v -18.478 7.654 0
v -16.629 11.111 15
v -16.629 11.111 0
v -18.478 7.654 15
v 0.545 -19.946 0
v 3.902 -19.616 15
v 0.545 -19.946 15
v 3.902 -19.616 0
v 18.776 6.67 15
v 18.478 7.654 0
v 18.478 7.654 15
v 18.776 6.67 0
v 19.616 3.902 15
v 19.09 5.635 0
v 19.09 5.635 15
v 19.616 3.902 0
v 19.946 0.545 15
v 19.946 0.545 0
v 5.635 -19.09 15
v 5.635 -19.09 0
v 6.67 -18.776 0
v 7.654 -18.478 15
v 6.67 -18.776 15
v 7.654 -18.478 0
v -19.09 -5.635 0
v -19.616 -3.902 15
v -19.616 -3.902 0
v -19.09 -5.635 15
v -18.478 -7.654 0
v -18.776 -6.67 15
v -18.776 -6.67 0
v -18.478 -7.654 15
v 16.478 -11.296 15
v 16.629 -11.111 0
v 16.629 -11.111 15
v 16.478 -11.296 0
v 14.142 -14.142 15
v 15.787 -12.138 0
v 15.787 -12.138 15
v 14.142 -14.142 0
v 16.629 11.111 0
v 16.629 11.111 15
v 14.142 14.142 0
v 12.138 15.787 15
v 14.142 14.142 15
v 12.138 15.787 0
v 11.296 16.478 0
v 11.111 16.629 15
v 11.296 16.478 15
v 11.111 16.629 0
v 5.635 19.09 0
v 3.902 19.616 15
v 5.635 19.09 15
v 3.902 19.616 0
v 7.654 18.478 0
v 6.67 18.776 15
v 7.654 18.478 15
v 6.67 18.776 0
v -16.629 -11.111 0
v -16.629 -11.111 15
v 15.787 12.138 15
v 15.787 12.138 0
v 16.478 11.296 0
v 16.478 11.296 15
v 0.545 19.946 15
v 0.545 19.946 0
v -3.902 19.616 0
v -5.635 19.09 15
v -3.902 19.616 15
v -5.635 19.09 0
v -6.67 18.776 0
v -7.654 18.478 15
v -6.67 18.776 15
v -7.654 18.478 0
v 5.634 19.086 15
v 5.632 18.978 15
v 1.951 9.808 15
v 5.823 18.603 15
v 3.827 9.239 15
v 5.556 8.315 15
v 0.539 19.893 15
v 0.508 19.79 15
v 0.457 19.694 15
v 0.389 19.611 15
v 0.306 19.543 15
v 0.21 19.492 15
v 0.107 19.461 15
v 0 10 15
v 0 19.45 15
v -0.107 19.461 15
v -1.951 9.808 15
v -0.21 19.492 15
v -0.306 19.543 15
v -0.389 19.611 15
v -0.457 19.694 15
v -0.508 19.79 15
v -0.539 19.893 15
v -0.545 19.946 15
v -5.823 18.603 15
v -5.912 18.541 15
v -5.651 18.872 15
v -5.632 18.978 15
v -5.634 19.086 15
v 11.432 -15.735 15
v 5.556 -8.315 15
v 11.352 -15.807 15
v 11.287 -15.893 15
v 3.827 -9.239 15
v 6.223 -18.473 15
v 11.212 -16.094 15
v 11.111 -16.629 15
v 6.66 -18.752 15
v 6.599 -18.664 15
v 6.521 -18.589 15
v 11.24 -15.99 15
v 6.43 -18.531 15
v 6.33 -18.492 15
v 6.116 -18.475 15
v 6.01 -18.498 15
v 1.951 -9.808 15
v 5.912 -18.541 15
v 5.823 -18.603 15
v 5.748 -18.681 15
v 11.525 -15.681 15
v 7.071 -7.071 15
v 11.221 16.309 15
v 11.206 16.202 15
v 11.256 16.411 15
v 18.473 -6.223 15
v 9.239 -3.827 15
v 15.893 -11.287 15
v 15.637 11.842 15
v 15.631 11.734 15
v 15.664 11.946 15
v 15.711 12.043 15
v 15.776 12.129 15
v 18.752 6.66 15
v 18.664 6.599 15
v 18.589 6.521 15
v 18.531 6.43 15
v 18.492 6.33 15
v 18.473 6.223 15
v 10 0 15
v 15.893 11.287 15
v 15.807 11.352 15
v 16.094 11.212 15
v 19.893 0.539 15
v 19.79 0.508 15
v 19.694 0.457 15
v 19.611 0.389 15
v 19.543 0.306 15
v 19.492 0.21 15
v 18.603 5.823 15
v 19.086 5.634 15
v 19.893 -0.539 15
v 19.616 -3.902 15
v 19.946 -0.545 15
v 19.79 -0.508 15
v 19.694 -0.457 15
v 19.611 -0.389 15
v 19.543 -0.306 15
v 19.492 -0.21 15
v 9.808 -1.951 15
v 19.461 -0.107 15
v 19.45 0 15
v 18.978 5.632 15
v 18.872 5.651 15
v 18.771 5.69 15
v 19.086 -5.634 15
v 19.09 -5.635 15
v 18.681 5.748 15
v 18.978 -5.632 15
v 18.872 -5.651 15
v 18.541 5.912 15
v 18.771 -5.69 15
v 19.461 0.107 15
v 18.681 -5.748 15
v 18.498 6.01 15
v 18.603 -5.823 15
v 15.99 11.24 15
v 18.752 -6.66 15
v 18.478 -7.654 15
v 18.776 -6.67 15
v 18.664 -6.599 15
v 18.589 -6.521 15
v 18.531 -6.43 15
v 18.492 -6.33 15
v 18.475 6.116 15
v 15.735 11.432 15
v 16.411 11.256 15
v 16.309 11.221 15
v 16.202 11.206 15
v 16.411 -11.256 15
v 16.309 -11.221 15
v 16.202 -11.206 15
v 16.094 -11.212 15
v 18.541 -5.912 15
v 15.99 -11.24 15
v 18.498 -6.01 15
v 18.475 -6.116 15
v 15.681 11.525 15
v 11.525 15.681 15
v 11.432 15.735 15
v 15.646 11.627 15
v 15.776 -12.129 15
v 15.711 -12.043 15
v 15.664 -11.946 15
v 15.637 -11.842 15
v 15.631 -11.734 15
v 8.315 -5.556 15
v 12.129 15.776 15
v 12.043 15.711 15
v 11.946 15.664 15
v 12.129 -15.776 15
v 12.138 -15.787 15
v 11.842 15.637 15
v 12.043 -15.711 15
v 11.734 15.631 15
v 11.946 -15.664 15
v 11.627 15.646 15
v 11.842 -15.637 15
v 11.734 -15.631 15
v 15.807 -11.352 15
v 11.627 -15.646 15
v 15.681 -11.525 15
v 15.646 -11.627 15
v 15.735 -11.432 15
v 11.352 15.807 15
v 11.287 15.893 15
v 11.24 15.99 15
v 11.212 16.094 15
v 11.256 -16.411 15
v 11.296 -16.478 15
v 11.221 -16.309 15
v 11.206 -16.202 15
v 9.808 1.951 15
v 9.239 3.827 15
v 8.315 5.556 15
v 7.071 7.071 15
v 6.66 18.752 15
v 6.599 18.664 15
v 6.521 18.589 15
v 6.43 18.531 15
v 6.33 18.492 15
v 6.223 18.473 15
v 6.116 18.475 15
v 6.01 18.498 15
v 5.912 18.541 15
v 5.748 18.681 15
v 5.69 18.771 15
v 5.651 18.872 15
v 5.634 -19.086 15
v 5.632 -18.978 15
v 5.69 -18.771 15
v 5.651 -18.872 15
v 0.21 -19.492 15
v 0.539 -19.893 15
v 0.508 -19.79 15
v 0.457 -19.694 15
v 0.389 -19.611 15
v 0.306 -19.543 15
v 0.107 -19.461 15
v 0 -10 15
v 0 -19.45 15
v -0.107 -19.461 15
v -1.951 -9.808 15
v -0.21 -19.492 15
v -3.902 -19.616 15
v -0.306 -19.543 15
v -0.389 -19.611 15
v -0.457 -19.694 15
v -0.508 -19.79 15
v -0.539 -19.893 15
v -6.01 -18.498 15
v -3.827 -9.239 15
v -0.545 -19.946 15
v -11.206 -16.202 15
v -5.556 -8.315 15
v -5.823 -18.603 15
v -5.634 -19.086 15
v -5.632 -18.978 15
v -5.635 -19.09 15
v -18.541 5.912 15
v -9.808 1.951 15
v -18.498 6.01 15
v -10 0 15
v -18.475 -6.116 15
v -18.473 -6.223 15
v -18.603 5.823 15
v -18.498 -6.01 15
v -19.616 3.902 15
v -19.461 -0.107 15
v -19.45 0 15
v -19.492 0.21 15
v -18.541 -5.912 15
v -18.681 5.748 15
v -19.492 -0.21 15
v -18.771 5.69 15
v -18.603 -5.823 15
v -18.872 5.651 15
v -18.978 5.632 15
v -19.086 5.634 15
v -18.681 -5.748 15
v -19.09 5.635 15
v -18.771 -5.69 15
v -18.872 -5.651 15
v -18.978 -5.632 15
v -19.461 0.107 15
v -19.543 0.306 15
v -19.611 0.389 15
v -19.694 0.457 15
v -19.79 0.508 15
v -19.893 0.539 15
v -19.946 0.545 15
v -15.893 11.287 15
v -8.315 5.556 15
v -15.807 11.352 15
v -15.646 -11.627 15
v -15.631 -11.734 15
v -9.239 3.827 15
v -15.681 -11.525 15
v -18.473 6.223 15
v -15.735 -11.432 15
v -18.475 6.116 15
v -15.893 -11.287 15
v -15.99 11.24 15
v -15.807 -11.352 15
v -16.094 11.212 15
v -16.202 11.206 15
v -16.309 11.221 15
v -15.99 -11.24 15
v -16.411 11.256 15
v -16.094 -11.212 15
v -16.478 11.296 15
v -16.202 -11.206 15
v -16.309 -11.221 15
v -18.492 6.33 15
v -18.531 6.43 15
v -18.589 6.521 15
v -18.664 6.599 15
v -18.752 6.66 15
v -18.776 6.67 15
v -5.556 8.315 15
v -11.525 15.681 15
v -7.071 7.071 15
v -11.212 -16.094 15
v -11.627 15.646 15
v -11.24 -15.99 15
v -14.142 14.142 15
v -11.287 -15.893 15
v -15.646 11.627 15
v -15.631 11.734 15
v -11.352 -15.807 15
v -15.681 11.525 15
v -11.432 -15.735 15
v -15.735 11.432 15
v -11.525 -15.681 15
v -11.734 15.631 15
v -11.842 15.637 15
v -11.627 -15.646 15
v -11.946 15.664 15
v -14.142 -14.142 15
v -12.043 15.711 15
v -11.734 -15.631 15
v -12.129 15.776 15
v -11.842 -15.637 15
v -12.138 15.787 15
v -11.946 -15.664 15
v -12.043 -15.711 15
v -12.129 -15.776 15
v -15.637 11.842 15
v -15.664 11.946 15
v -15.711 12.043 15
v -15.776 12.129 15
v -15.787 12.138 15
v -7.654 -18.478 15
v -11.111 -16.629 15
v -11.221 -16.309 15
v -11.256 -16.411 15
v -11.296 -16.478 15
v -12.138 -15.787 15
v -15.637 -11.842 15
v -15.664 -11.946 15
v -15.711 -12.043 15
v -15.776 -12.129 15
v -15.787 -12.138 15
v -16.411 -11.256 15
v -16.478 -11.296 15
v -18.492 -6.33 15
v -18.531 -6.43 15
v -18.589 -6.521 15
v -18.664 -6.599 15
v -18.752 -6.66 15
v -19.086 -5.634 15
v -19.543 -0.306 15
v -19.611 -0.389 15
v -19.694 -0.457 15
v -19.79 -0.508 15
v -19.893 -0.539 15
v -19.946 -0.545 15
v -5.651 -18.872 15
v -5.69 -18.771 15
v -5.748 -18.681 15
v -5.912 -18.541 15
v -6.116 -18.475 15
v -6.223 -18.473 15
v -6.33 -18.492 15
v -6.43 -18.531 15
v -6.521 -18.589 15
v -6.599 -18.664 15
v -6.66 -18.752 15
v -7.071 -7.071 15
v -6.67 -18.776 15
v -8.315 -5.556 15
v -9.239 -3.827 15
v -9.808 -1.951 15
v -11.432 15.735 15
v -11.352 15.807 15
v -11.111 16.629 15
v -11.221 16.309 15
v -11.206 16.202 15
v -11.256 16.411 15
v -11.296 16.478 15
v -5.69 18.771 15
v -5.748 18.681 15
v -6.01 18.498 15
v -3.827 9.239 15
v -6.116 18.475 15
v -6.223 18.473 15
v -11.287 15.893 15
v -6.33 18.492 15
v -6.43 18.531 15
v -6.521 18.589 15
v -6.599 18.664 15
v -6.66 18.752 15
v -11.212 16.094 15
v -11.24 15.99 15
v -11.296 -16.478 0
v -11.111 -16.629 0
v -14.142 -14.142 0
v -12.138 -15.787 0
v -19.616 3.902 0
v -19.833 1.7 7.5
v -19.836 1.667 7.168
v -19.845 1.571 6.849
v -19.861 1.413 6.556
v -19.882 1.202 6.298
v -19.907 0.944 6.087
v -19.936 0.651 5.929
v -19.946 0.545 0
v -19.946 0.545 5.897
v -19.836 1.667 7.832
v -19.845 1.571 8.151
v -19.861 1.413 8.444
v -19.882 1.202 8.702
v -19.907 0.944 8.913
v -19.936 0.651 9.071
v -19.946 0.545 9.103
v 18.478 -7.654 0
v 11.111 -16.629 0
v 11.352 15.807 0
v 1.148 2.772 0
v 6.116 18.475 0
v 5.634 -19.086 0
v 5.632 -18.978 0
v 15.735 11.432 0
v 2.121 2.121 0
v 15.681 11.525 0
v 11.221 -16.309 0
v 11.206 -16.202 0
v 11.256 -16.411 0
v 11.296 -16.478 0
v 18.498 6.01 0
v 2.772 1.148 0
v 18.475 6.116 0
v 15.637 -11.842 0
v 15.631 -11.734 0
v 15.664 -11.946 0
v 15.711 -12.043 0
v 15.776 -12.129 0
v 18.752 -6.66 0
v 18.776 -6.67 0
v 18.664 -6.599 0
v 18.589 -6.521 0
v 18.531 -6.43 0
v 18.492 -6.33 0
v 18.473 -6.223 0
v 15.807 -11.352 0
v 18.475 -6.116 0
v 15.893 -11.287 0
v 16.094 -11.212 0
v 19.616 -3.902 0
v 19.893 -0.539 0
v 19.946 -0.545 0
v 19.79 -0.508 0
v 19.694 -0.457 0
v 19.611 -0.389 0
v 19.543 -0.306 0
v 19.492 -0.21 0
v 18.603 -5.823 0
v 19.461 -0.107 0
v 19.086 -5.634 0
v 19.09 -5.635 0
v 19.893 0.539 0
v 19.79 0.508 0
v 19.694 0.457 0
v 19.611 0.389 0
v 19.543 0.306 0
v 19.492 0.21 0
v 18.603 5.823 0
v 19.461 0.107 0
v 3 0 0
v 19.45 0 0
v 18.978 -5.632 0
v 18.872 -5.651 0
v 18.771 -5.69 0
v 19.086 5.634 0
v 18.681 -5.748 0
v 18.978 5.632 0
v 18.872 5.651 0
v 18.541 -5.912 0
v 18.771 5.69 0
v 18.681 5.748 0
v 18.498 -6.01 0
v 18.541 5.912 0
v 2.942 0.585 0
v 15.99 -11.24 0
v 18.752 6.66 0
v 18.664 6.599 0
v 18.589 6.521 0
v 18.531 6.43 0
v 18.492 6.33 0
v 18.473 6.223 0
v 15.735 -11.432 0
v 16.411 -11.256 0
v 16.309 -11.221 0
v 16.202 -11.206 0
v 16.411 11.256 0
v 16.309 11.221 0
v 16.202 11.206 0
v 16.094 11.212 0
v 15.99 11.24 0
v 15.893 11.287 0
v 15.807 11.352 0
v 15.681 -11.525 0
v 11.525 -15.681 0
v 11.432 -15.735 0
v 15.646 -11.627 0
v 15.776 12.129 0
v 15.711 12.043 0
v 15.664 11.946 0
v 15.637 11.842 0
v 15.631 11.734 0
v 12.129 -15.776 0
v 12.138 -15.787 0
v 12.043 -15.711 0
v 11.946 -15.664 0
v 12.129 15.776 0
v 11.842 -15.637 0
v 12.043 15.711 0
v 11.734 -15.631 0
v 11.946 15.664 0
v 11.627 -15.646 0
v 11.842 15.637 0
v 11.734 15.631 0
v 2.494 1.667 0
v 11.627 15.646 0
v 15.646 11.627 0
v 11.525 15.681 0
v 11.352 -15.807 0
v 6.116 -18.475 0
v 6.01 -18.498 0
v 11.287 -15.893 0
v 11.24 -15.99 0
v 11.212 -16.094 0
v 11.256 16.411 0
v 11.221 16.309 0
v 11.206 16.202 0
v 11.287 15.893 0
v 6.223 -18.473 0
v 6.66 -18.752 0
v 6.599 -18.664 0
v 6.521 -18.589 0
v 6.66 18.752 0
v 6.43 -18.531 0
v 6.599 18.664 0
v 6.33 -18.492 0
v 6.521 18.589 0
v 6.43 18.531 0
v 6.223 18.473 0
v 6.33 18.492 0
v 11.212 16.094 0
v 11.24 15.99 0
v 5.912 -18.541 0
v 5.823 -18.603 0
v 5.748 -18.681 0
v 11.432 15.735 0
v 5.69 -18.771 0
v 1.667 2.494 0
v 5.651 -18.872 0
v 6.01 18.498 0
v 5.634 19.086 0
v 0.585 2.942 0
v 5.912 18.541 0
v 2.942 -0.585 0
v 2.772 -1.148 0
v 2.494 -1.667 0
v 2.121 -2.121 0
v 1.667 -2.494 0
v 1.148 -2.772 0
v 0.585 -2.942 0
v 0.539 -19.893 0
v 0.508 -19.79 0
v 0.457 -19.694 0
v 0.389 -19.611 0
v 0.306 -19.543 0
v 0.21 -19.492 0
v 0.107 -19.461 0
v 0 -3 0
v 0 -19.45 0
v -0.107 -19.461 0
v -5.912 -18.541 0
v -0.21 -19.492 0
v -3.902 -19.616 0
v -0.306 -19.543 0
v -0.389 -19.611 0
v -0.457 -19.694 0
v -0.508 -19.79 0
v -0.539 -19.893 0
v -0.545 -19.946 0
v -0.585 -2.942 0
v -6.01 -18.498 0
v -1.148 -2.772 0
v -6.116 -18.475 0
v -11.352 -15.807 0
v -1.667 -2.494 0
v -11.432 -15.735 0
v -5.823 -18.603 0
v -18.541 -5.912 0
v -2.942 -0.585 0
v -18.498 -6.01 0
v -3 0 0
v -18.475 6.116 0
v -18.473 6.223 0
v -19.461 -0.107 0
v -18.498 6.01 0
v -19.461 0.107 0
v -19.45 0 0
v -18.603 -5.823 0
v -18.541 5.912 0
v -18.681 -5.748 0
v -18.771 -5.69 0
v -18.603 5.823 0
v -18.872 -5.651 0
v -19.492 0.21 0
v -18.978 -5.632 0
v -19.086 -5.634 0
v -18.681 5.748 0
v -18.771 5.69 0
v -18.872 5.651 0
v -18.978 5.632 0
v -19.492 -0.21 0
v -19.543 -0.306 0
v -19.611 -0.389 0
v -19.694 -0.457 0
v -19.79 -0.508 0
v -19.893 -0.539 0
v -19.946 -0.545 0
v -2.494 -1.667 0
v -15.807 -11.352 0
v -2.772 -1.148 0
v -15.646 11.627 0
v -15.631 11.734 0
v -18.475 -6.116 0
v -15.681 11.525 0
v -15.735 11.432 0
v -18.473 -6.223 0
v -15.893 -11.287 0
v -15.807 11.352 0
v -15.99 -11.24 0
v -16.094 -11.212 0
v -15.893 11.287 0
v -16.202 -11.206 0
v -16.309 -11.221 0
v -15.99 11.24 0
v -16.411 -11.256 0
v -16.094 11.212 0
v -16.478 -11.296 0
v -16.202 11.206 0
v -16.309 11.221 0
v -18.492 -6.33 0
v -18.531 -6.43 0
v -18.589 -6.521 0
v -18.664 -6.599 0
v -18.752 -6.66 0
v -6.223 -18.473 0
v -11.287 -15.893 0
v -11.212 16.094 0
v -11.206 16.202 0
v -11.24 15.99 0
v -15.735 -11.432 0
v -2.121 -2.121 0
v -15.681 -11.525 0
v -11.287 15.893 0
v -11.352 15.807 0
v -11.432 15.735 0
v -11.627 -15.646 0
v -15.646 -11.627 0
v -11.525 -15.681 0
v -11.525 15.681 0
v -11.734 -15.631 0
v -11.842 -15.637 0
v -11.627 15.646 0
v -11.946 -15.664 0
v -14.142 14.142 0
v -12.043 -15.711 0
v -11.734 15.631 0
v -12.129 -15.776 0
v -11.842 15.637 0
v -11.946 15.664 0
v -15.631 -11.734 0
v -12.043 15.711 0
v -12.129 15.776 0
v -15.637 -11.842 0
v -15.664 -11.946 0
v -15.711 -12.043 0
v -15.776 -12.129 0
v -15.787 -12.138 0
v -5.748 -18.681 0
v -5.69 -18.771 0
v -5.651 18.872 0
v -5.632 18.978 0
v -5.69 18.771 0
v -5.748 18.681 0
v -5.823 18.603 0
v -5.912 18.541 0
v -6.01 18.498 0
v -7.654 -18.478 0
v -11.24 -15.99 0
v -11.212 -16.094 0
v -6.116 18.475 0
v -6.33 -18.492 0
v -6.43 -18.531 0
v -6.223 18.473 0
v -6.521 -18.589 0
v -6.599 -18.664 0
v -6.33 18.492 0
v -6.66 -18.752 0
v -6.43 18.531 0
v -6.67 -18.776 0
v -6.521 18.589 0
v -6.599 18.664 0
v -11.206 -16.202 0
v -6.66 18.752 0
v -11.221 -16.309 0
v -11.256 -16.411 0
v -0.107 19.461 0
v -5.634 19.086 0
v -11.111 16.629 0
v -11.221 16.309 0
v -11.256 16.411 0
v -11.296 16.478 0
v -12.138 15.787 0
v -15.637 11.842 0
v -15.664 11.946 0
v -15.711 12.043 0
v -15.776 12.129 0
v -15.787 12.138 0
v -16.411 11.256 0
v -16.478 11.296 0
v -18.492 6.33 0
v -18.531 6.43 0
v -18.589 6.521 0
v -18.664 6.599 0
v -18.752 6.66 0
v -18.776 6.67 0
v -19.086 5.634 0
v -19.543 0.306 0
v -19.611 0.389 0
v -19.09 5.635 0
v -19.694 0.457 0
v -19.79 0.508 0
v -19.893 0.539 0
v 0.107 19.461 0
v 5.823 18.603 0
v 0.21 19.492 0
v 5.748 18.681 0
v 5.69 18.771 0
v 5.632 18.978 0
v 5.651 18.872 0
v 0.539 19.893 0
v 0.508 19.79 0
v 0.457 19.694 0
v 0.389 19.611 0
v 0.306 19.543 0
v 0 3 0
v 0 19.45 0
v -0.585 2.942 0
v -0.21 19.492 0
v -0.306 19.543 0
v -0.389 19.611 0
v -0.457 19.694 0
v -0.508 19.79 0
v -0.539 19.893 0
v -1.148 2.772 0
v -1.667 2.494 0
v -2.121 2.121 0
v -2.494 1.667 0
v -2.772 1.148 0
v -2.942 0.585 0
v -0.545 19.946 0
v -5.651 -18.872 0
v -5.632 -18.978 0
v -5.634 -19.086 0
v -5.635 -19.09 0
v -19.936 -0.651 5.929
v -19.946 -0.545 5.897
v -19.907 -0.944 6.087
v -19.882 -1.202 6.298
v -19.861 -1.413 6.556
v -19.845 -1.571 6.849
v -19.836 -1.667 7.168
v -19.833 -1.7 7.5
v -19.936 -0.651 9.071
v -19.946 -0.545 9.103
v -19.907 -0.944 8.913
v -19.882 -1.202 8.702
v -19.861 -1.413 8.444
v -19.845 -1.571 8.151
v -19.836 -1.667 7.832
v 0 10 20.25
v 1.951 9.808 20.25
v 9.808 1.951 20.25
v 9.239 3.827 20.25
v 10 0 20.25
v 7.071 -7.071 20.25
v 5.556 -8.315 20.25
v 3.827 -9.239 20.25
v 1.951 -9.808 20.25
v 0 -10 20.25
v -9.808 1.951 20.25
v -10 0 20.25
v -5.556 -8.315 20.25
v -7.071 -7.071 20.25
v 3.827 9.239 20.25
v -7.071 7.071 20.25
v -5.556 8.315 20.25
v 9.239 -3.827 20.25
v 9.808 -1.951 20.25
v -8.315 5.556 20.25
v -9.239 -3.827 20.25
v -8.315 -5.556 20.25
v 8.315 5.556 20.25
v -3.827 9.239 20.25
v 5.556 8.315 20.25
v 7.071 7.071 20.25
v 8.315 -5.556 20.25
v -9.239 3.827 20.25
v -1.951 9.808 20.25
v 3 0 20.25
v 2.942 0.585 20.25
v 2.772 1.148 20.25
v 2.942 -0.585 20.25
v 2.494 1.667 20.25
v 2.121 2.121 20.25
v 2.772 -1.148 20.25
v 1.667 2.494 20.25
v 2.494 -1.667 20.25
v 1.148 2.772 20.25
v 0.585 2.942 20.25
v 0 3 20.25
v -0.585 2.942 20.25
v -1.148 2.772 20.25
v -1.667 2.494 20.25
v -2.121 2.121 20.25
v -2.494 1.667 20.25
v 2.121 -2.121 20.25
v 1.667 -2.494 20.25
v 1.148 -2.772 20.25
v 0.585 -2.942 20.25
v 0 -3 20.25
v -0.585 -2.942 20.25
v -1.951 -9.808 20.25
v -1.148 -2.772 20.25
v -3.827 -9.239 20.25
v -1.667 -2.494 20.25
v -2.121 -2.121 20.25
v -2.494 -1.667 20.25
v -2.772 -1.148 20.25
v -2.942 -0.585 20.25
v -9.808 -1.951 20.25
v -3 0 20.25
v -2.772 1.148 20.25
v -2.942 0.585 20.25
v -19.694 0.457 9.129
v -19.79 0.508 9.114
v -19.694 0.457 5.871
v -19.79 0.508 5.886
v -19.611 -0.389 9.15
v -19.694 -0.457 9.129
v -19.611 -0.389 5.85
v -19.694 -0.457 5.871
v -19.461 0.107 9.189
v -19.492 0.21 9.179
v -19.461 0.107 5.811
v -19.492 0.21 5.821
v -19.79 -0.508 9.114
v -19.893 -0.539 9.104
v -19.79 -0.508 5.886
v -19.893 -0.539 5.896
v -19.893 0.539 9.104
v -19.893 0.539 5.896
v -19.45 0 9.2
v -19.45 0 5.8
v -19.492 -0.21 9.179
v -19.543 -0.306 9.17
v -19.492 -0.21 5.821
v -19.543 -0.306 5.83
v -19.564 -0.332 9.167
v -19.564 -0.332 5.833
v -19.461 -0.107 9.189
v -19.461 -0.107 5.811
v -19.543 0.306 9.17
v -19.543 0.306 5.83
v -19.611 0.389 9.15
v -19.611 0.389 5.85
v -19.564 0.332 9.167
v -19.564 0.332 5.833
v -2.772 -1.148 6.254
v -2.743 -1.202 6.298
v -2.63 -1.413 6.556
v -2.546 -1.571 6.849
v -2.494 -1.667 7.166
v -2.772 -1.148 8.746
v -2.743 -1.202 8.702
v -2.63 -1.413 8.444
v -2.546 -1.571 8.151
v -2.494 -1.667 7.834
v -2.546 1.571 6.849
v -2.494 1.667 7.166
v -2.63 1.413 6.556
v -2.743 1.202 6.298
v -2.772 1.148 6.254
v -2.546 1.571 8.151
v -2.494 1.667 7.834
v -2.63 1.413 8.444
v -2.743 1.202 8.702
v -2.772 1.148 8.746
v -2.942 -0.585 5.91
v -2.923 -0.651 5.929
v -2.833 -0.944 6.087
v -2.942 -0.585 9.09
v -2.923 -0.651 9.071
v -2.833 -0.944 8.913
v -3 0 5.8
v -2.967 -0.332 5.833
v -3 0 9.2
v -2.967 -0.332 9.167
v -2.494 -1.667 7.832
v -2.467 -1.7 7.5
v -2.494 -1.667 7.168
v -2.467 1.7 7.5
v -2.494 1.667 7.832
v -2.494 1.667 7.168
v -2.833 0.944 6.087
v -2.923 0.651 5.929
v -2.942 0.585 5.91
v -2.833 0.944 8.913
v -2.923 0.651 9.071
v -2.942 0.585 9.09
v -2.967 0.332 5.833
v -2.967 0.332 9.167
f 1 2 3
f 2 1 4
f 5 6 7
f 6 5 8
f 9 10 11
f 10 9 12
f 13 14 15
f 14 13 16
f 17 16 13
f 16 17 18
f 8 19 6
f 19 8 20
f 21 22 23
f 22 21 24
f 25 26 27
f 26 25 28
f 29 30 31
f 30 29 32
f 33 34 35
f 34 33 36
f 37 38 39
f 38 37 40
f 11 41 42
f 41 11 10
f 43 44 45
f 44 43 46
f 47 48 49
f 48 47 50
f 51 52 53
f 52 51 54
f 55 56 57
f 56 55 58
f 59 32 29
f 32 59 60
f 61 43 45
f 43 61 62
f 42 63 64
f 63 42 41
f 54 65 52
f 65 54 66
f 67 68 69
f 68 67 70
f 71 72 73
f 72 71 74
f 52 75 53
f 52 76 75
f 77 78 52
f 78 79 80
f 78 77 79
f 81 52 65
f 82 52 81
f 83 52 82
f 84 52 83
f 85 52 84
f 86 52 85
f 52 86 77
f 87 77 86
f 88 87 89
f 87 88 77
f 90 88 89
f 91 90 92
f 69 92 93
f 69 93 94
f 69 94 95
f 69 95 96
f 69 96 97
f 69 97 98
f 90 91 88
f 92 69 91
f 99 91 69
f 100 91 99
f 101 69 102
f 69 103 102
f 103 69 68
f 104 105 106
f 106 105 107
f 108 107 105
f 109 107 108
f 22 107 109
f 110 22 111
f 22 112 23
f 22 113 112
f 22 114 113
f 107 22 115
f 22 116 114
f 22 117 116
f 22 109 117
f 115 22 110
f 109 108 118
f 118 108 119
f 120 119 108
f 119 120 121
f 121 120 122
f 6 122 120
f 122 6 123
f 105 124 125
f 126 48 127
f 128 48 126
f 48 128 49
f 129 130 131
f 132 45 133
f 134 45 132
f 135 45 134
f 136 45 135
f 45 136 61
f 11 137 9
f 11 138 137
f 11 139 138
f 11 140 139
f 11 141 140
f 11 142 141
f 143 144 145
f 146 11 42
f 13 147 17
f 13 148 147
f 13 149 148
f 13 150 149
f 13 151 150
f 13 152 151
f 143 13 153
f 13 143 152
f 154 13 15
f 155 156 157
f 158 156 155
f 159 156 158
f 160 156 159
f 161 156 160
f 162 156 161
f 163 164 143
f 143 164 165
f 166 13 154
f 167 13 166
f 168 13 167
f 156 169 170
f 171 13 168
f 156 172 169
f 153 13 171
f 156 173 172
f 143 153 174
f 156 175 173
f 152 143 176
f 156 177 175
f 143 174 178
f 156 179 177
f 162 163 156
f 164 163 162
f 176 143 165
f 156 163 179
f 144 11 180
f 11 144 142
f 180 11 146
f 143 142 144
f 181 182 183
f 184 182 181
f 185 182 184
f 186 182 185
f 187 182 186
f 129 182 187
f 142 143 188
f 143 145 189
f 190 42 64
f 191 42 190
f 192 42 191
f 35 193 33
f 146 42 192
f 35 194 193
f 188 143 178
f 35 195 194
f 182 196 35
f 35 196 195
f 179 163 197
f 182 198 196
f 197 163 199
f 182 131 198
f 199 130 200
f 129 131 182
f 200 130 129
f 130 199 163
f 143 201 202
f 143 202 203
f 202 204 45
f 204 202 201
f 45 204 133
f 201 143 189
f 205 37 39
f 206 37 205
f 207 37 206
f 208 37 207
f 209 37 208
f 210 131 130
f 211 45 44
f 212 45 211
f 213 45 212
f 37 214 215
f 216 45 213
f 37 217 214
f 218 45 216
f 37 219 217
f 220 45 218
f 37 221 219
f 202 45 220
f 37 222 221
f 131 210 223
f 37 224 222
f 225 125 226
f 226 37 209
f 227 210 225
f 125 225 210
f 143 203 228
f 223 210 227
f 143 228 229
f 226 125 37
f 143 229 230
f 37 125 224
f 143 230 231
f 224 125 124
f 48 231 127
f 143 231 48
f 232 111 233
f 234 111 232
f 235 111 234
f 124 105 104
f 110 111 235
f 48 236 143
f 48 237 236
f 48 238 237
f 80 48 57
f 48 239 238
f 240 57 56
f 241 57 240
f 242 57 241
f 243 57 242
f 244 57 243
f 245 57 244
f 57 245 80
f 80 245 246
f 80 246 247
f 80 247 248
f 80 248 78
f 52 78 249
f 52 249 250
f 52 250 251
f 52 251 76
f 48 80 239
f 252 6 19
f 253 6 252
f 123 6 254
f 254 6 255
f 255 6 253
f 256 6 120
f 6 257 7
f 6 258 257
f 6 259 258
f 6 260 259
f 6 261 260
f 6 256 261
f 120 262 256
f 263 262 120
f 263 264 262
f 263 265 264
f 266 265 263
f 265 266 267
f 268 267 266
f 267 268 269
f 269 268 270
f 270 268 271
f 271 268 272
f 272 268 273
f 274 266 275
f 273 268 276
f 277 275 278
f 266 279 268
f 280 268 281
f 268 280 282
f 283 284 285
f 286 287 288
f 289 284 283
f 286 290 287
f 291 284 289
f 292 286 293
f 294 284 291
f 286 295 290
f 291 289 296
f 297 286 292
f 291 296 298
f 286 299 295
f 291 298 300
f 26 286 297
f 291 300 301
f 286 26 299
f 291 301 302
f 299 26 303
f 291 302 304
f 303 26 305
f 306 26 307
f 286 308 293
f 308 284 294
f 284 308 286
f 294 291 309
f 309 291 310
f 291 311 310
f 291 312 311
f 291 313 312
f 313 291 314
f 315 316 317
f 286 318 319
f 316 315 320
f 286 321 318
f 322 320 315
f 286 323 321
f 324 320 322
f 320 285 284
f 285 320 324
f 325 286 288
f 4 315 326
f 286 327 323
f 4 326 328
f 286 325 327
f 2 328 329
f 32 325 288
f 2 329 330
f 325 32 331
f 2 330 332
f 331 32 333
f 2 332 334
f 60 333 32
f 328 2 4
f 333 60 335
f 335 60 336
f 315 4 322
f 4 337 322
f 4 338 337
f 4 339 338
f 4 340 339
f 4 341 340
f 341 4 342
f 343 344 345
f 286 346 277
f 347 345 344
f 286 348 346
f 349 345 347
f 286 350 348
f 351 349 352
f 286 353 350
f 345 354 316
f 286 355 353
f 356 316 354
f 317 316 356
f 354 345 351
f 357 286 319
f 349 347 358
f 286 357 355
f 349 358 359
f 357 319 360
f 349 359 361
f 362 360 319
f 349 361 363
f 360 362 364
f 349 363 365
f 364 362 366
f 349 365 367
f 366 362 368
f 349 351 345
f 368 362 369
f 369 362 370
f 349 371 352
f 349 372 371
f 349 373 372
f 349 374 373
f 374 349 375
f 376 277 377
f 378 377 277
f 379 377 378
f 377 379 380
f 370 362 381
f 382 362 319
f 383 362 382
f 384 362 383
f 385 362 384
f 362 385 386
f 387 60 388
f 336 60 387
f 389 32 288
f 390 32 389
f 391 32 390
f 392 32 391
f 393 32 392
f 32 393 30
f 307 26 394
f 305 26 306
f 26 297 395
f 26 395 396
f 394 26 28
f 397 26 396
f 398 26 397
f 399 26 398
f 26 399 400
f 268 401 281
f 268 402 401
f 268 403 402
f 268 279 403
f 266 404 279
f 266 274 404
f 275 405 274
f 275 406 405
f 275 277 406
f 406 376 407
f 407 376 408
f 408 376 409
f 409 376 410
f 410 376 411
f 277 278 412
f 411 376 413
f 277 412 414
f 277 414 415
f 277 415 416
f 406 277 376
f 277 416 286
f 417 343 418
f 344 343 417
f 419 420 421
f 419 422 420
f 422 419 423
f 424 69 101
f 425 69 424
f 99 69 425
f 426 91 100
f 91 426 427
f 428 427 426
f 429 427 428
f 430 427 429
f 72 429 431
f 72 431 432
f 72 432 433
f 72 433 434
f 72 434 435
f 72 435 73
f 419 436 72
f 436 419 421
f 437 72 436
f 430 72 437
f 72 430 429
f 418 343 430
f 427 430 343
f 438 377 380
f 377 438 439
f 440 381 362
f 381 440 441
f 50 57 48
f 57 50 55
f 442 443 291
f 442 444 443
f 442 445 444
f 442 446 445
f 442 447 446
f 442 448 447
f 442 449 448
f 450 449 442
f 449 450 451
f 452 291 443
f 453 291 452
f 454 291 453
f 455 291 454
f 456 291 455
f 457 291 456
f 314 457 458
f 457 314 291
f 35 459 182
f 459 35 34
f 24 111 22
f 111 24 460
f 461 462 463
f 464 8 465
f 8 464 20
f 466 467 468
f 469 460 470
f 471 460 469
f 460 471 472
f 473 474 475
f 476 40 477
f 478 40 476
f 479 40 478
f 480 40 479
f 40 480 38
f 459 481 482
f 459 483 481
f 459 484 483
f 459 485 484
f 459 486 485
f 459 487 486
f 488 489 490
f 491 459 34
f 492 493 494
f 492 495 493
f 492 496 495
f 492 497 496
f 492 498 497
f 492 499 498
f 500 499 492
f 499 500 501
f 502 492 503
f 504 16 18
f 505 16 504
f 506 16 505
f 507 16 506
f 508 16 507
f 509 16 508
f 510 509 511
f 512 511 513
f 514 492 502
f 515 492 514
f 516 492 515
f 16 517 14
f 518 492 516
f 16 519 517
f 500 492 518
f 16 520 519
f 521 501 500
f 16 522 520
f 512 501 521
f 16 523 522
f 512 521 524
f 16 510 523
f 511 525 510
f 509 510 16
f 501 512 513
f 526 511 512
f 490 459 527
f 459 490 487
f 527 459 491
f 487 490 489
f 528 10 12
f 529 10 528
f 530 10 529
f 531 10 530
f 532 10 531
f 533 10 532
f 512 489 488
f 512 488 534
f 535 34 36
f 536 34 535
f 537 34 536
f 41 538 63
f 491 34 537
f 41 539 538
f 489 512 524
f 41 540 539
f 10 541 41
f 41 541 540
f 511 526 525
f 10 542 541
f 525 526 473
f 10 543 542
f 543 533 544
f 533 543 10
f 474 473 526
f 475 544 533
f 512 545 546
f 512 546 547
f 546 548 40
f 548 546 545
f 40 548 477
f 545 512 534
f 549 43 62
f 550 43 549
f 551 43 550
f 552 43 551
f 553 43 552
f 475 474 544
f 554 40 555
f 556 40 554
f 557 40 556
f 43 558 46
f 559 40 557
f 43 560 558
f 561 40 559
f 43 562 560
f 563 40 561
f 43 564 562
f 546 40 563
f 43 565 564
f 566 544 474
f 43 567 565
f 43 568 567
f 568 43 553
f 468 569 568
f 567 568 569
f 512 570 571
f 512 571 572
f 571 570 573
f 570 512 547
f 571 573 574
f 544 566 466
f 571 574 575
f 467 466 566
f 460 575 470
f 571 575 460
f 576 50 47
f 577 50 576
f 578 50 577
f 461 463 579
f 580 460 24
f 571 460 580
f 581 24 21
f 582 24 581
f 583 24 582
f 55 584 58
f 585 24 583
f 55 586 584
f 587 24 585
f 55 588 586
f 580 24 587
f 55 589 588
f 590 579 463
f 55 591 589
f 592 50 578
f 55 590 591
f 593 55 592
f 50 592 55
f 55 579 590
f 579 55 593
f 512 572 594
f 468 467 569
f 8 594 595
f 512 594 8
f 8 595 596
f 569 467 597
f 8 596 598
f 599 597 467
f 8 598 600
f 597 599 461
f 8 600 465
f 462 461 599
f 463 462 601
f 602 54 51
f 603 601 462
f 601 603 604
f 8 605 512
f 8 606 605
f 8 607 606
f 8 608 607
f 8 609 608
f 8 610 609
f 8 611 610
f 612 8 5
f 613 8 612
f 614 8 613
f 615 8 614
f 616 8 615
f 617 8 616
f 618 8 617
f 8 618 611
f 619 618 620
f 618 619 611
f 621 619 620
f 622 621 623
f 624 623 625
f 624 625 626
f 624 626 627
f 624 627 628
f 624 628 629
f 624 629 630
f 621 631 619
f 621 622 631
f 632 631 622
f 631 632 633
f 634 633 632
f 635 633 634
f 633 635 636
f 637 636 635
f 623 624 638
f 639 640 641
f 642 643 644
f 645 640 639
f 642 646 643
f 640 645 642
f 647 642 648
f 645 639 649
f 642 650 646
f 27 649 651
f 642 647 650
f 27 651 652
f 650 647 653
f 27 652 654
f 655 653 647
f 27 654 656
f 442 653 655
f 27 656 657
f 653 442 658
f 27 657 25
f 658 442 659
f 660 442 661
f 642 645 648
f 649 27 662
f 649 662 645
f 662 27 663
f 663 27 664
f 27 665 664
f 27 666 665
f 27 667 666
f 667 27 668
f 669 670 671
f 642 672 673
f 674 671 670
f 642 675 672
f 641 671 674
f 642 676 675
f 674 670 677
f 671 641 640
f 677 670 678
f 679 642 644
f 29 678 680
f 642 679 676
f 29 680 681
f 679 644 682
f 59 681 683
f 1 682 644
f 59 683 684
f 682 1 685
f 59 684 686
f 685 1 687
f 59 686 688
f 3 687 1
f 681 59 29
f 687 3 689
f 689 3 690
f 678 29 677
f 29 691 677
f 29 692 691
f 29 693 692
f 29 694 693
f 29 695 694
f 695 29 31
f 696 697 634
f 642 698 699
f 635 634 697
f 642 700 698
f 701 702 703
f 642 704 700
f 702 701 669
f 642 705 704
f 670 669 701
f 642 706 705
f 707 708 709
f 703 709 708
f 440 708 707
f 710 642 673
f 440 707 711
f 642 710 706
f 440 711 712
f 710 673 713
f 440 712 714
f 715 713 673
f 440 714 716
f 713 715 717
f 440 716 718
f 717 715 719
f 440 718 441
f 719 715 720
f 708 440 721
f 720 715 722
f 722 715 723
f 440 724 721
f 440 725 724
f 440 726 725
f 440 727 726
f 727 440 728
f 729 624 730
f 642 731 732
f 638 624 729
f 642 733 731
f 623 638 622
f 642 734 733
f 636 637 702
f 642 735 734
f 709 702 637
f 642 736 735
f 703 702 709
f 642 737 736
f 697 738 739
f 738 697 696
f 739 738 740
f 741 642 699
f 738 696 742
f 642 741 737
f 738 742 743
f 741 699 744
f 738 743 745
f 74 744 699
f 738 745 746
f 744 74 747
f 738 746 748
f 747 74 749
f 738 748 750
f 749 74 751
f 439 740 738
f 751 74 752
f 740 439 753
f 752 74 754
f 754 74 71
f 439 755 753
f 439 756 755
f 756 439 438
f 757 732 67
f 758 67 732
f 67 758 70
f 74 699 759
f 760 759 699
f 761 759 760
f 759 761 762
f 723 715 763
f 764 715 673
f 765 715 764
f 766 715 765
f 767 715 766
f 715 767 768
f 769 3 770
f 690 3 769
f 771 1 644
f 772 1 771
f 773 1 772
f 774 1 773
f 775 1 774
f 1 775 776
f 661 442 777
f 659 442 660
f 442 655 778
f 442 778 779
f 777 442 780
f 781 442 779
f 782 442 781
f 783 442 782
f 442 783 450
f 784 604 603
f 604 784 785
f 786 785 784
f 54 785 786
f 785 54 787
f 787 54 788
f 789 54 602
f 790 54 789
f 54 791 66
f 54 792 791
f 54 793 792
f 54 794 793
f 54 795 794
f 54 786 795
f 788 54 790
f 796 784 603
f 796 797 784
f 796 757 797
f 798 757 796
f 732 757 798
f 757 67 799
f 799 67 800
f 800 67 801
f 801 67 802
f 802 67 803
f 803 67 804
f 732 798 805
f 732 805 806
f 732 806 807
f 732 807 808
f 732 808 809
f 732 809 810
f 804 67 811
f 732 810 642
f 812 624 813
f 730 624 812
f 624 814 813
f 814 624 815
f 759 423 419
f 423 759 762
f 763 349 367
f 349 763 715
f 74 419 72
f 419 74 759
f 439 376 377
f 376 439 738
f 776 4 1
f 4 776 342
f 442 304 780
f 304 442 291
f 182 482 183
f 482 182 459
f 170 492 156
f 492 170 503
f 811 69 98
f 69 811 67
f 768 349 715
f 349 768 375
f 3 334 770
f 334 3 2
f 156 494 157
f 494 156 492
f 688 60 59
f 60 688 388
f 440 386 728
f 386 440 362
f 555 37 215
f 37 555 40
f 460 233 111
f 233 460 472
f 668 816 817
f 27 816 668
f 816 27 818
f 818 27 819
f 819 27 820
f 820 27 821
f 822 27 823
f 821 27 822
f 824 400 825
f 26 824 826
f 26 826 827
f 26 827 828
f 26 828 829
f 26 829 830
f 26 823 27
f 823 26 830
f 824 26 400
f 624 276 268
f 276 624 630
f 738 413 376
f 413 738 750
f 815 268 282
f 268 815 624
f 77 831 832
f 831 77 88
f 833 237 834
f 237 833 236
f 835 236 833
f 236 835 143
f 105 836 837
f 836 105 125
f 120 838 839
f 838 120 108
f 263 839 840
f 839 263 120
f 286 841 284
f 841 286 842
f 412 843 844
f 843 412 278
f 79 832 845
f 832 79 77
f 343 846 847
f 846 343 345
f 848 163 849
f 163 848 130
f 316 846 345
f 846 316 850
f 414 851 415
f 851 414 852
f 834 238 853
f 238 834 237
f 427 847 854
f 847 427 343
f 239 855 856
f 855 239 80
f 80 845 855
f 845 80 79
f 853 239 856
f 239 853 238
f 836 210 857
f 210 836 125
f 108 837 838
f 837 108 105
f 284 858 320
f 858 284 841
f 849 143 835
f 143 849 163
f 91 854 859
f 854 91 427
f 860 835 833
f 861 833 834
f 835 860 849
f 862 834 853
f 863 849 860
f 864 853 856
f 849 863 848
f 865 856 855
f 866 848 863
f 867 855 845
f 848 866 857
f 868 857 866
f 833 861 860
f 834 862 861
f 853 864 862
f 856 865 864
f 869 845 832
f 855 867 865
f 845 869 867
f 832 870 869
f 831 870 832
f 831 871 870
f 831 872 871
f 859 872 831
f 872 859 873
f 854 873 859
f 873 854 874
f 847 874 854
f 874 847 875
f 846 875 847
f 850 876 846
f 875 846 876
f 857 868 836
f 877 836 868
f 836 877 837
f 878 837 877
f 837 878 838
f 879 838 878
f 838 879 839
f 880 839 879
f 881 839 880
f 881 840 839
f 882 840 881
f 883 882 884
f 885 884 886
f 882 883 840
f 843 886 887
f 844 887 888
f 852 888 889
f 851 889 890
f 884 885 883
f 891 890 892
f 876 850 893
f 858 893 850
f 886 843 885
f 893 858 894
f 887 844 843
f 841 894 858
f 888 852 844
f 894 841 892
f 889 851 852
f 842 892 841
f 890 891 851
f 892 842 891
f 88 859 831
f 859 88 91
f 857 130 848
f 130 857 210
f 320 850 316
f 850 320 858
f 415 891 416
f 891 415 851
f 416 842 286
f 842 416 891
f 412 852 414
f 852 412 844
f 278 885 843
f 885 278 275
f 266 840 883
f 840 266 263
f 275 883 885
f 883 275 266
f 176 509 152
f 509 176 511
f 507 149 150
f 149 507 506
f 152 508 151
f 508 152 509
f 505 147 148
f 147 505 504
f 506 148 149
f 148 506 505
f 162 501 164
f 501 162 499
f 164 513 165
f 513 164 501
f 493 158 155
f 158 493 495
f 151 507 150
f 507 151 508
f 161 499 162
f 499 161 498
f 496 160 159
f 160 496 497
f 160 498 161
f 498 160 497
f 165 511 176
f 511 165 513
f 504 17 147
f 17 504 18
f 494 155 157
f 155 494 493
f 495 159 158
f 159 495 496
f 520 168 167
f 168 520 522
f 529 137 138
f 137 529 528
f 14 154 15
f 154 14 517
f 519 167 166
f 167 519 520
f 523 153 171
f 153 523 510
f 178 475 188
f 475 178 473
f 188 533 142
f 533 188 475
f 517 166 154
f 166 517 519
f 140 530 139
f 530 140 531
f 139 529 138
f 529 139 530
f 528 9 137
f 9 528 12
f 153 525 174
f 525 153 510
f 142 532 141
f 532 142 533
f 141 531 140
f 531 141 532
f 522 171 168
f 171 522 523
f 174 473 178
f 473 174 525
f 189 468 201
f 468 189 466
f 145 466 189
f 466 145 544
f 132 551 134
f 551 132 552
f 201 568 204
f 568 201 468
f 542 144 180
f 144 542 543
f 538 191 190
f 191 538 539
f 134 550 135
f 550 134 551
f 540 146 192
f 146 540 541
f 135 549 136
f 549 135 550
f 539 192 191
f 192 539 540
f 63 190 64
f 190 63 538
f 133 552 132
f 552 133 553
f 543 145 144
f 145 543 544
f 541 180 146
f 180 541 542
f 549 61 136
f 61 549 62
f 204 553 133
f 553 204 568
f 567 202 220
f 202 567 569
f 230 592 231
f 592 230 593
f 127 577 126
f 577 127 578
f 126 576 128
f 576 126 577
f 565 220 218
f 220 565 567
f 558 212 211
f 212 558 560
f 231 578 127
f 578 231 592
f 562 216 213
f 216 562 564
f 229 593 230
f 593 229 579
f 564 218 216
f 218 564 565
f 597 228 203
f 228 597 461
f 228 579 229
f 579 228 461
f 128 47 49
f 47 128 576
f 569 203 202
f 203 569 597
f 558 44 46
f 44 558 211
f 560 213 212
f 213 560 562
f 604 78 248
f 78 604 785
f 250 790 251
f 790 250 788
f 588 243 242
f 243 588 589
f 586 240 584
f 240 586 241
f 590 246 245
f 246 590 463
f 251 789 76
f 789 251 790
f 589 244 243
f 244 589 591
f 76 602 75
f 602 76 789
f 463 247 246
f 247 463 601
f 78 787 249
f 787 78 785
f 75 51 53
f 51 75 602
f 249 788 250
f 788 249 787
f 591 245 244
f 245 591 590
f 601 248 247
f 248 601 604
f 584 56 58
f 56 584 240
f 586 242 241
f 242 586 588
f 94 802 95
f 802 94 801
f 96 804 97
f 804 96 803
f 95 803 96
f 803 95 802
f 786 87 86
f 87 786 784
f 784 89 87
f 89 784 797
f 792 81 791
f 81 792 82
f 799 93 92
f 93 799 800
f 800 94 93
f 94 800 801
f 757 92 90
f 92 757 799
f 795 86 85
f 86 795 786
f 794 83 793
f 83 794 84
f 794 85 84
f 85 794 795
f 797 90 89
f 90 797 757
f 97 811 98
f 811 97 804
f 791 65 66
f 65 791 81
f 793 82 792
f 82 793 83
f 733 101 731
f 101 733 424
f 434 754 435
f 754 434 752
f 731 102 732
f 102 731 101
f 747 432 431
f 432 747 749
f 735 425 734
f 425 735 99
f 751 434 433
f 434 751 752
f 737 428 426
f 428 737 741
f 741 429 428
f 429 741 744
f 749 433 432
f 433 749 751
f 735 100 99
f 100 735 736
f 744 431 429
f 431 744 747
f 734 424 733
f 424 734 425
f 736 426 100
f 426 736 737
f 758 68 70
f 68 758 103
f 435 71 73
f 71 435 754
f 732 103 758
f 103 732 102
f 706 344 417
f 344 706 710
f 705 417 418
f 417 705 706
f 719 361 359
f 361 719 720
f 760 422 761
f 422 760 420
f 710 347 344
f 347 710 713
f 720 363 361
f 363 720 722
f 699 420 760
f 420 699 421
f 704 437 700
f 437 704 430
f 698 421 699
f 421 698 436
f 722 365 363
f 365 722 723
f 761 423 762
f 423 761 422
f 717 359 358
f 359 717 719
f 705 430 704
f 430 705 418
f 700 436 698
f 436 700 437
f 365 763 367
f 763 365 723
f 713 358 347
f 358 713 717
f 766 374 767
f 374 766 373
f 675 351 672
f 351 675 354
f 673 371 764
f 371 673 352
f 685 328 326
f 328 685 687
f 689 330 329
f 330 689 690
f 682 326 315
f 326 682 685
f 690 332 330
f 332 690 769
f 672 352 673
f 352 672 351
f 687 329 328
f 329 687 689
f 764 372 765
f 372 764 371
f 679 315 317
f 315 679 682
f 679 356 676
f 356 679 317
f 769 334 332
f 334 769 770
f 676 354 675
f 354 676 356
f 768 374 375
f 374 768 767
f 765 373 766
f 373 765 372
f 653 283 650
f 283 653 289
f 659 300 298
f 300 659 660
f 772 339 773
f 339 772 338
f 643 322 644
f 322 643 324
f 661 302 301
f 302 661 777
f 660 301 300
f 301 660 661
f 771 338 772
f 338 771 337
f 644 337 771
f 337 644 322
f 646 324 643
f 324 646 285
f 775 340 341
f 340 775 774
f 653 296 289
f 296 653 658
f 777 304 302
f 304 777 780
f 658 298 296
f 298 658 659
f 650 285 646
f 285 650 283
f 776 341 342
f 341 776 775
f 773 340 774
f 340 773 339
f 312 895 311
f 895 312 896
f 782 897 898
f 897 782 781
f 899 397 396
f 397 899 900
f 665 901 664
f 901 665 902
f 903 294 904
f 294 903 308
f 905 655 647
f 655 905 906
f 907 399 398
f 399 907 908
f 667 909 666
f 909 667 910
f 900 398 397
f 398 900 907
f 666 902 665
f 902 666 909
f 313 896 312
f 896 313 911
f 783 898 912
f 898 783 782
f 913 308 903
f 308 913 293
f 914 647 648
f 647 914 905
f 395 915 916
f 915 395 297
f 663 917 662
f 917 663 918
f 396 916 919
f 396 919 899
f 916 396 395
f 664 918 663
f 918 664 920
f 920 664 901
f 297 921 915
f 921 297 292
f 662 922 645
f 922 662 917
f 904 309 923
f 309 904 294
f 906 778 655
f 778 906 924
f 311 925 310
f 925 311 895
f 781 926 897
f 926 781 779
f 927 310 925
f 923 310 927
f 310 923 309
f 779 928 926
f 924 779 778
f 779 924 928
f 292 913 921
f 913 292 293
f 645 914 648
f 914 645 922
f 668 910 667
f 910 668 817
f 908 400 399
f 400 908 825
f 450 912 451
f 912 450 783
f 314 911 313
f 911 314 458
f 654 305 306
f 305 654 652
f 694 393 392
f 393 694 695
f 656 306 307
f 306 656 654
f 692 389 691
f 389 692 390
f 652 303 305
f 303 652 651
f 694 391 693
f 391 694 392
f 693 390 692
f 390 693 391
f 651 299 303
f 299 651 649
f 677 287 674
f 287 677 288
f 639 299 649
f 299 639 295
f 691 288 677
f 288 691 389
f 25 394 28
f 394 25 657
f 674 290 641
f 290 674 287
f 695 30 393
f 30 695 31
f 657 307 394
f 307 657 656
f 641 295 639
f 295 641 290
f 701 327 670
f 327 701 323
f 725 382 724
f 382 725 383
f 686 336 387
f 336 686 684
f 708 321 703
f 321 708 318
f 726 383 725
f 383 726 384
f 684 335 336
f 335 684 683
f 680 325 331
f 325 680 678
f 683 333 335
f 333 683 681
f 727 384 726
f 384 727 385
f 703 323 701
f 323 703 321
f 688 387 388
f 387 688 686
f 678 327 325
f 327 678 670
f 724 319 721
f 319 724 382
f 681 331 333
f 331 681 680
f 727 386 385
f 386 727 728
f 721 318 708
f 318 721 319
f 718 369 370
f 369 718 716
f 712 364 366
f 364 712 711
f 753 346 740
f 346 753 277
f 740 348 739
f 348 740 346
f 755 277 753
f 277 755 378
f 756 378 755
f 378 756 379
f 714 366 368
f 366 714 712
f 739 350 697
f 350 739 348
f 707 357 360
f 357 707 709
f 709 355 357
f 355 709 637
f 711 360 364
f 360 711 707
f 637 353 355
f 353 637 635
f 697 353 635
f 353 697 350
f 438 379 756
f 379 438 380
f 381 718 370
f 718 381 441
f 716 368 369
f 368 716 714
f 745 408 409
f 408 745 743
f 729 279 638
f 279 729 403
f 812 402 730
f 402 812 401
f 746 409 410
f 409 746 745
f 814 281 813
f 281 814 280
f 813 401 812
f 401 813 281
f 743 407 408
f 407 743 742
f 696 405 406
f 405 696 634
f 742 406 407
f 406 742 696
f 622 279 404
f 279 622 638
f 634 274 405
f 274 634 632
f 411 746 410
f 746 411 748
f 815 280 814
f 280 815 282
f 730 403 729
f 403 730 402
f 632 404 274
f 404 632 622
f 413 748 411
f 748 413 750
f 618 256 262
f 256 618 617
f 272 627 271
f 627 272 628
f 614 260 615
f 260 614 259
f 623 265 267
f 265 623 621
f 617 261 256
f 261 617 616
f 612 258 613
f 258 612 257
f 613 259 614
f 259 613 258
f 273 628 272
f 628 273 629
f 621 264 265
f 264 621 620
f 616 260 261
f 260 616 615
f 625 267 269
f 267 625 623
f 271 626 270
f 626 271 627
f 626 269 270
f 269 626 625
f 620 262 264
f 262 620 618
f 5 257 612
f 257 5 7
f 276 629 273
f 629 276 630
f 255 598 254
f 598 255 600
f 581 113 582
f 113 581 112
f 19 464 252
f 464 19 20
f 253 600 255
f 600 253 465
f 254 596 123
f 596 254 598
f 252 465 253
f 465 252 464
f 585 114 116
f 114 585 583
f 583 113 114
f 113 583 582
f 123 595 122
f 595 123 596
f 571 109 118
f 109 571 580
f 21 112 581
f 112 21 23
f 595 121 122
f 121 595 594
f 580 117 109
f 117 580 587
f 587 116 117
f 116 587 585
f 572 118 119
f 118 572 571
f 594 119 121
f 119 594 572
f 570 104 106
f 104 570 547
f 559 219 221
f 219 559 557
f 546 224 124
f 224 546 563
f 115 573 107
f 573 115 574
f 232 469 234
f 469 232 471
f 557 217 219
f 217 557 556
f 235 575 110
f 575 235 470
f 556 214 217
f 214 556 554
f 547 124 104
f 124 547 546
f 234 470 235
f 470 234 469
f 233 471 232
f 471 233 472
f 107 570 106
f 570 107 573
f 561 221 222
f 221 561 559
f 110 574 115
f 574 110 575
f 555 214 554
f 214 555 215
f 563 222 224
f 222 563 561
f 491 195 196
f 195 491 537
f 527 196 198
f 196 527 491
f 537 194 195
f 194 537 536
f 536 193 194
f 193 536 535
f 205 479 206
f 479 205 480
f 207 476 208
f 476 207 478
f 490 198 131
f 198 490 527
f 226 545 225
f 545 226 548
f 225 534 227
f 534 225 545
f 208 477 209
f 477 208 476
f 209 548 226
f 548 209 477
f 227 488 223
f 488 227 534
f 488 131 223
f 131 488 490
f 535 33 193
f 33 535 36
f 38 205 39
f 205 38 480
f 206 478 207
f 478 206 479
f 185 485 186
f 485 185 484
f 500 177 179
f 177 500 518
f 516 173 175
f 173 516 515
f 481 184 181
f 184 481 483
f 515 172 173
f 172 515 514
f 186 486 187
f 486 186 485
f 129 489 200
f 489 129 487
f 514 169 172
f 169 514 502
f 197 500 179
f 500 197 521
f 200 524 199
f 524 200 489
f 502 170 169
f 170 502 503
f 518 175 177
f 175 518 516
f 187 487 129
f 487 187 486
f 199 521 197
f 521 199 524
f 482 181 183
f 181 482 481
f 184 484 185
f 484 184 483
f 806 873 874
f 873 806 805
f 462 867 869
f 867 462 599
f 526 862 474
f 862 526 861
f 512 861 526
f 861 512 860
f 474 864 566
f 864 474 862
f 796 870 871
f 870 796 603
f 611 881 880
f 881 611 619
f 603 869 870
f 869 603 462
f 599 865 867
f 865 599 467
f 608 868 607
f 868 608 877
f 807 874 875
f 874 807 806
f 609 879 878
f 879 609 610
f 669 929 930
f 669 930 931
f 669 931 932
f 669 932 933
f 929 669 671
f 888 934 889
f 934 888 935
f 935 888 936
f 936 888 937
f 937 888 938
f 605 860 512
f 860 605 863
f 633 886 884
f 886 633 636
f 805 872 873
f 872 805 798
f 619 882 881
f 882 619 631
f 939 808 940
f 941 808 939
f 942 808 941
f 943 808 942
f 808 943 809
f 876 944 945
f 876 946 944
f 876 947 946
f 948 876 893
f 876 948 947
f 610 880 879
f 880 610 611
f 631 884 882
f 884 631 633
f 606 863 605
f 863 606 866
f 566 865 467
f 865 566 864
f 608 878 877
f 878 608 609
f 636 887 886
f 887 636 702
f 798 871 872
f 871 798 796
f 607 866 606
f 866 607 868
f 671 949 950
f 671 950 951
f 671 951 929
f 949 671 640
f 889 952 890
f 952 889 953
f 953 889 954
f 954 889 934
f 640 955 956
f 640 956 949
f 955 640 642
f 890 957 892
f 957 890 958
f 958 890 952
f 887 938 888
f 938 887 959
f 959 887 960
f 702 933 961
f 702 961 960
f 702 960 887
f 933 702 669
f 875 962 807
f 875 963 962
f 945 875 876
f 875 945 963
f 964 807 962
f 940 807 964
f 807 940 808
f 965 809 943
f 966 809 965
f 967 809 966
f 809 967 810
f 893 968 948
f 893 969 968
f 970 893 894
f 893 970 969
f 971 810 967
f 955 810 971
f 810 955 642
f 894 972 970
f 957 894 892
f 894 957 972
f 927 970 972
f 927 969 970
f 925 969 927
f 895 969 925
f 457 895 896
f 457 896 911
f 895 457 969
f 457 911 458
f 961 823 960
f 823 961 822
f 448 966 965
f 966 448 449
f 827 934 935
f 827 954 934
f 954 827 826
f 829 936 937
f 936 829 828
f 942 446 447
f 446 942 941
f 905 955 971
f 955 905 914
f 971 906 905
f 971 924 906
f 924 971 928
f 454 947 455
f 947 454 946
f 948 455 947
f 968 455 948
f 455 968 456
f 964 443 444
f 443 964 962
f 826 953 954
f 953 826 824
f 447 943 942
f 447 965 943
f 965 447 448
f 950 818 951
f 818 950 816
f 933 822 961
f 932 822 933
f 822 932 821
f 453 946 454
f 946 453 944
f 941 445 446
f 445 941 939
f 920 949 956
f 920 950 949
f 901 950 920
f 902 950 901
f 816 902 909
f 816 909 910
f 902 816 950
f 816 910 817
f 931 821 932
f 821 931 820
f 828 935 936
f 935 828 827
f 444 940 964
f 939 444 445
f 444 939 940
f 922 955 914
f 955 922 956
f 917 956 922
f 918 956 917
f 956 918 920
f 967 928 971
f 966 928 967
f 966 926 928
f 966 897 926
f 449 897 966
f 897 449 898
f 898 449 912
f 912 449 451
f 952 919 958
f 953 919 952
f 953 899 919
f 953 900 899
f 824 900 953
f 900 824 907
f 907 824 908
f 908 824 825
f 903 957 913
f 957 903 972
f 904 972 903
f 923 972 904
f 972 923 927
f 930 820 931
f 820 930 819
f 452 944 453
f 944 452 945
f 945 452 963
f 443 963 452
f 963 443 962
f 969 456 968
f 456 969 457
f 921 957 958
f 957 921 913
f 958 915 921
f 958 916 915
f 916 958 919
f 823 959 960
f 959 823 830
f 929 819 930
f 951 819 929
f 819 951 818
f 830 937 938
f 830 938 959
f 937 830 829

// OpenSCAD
$fn = 32;

// ----------------------------------------------------------------------
// Hand knob: 40 x 40 x 20.25 mm
// ----------------------------------------------------------------------

// --- parameters (mm) ---
head_d = 40;              // knob diameter
head_h = 15;              // knob height
hole_d = 6;               // shaft bore
set_d = 3.4;              // set screw tap hole
notch_d = 1.1;            // knurl groove diameter
knurl_n = 20;             // number of knurl grooves
cap_h = 5.25;             // raised centre cap
cap_d = 20;               // centre cap diameter

module body() {
  cylinder(h = head_h, d = head_d);
}

module cap() {
  translate([0, 0, head_h - 1]) cylinder(h = cap_h + 1, d = cap_d);
}

difference() {
  union() {
    body();
    cap();
  }
  translate([0, 0, -1]) cylinder(h = head_h + cap_h + 2, d = hole_d);
  /* knurl grooves */
  for (i = [0 : knurl_n - 1])
    rotate([0, 0, i * 360 / knurl_n])
      translate([head_d / 2, 0, -0.5])
        cylinder(h = head_h + 1, d = notch_d);
  translate([-head_d / 2 - 1, 0, head_h * 0.5]) rotate([0, 90, 0]) cylinder(h = head_d / 2 + 2, d = set_d);
}
